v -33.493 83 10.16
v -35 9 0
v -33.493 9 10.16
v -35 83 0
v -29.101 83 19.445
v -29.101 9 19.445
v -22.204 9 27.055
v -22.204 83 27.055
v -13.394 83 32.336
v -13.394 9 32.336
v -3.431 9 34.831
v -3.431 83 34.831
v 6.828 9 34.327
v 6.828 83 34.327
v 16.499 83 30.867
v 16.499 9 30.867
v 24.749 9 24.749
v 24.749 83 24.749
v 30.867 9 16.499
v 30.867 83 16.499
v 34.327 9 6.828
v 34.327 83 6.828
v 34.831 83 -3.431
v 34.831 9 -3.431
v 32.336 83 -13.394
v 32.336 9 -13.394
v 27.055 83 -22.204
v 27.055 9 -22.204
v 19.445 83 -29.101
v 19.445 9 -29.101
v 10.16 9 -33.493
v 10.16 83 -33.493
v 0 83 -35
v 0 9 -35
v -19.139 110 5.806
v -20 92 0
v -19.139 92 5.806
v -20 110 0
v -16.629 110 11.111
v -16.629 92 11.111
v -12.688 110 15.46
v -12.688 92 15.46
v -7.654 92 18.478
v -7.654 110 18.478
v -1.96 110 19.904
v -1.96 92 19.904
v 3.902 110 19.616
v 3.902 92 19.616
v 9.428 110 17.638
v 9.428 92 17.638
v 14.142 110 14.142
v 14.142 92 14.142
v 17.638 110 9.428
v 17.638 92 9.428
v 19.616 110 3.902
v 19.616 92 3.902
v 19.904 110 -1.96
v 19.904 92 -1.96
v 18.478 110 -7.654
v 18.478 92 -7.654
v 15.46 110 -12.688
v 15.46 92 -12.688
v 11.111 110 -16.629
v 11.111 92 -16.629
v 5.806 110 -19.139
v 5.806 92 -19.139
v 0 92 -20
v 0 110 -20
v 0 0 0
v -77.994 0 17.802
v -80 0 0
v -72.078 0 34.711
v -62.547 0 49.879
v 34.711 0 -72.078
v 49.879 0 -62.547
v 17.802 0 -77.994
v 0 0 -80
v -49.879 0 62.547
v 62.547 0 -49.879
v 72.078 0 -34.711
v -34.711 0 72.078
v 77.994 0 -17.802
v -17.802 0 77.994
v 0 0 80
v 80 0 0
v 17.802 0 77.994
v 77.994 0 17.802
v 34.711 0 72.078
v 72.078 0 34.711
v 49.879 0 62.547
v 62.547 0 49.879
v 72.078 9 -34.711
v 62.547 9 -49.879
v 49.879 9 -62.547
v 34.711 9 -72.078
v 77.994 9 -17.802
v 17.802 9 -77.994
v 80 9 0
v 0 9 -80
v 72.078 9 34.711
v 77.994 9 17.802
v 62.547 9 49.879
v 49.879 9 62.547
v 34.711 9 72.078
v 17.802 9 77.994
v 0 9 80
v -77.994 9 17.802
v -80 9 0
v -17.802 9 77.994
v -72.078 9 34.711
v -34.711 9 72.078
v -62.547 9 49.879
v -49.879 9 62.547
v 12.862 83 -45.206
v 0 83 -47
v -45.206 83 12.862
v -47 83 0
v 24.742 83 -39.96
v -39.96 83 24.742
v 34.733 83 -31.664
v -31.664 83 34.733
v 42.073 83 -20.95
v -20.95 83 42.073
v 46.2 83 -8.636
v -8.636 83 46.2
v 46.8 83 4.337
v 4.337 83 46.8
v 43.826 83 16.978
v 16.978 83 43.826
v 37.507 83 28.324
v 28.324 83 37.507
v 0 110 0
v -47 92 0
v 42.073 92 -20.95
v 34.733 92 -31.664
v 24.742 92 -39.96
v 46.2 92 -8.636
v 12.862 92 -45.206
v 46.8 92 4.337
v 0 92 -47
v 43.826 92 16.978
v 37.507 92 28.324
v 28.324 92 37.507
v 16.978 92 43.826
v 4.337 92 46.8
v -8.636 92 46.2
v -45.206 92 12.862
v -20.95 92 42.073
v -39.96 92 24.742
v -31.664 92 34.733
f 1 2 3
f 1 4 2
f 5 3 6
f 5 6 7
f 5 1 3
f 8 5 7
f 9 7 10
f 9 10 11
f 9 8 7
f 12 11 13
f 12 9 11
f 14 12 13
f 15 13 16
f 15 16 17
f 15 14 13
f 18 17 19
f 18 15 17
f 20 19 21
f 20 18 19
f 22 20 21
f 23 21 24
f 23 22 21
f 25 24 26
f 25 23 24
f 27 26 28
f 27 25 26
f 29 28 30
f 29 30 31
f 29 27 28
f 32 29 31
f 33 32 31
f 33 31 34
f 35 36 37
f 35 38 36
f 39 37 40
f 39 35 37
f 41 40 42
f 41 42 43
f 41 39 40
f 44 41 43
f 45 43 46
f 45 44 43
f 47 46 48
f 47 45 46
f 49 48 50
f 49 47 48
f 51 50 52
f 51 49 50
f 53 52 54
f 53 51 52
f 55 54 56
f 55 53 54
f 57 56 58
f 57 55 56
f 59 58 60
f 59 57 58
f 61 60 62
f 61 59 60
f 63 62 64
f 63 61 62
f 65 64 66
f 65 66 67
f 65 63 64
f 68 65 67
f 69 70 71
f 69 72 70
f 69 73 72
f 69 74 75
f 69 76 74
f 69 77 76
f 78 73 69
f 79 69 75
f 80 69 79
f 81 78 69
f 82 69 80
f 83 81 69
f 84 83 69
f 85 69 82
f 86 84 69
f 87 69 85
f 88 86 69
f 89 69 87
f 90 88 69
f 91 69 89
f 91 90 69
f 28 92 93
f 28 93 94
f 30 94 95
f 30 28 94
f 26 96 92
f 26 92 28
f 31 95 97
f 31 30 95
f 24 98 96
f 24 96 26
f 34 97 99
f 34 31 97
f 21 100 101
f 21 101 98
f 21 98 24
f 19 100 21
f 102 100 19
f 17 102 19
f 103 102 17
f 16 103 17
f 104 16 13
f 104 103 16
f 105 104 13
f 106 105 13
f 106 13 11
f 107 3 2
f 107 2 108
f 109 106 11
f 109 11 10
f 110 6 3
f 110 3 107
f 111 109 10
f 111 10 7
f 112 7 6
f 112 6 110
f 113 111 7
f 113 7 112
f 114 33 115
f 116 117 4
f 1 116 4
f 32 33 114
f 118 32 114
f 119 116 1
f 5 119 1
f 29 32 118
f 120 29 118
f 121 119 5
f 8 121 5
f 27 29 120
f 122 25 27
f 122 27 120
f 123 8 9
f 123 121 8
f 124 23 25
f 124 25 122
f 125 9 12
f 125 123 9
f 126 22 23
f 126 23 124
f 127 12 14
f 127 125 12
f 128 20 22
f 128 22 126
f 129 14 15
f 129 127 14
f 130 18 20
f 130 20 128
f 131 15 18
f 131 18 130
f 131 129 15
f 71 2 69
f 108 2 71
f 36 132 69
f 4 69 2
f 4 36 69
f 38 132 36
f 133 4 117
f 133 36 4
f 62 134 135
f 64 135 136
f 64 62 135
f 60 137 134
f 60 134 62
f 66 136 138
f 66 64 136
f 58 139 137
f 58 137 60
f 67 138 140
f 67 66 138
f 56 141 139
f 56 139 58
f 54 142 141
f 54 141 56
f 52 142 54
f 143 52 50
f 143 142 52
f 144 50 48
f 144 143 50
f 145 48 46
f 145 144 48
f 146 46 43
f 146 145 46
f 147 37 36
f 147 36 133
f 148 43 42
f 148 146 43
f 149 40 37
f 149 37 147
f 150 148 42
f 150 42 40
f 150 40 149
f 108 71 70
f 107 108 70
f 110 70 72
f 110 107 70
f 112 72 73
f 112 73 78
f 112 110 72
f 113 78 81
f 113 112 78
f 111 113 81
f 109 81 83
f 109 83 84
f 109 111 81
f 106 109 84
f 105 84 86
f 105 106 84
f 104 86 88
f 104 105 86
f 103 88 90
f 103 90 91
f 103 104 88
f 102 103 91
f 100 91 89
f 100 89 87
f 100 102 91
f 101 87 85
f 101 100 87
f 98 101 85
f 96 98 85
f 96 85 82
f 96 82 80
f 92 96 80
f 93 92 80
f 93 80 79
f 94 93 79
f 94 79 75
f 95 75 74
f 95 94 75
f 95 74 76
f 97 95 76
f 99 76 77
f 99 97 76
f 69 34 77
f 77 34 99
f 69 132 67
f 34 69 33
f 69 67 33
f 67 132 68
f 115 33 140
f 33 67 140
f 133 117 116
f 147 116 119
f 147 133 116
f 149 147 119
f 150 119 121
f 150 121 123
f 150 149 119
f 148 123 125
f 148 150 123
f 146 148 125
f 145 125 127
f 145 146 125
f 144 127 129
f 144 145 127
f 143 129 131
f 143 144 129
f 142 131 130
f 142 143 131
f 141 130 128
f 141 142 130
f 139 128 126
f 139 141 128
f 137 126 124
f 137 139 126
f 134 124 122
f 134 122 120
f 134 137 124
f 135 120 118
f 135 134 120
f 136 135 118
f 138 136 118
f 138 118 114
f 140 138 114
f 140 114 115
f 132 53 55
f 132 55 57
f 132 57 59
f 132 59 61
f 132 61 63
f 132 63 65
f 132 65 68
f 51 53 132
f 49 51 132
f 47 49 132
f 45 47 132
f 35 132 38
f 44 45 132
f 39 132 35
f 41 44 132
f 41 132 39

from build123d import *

# Parameters (mm, degrees)
REVOLVE1_ANGLE = 270


with BuildPart() as part:
    # Sketch1 → Revolve1 (revolve)
    with BuildSketch(Plane.XY):
        Polygon((0, 0), (-80, 0), (-80, 9), (-35, 9), (-35, 83), (-47, 83), (-47, 92), (-20, 92), (-20, 110), (0, 110), align=None)
    revolve(axis=Axis((0, 0, 0), (0, 1, 0)), revolution_arc=REVOLVE1_ANGLE)


solid = part.part
